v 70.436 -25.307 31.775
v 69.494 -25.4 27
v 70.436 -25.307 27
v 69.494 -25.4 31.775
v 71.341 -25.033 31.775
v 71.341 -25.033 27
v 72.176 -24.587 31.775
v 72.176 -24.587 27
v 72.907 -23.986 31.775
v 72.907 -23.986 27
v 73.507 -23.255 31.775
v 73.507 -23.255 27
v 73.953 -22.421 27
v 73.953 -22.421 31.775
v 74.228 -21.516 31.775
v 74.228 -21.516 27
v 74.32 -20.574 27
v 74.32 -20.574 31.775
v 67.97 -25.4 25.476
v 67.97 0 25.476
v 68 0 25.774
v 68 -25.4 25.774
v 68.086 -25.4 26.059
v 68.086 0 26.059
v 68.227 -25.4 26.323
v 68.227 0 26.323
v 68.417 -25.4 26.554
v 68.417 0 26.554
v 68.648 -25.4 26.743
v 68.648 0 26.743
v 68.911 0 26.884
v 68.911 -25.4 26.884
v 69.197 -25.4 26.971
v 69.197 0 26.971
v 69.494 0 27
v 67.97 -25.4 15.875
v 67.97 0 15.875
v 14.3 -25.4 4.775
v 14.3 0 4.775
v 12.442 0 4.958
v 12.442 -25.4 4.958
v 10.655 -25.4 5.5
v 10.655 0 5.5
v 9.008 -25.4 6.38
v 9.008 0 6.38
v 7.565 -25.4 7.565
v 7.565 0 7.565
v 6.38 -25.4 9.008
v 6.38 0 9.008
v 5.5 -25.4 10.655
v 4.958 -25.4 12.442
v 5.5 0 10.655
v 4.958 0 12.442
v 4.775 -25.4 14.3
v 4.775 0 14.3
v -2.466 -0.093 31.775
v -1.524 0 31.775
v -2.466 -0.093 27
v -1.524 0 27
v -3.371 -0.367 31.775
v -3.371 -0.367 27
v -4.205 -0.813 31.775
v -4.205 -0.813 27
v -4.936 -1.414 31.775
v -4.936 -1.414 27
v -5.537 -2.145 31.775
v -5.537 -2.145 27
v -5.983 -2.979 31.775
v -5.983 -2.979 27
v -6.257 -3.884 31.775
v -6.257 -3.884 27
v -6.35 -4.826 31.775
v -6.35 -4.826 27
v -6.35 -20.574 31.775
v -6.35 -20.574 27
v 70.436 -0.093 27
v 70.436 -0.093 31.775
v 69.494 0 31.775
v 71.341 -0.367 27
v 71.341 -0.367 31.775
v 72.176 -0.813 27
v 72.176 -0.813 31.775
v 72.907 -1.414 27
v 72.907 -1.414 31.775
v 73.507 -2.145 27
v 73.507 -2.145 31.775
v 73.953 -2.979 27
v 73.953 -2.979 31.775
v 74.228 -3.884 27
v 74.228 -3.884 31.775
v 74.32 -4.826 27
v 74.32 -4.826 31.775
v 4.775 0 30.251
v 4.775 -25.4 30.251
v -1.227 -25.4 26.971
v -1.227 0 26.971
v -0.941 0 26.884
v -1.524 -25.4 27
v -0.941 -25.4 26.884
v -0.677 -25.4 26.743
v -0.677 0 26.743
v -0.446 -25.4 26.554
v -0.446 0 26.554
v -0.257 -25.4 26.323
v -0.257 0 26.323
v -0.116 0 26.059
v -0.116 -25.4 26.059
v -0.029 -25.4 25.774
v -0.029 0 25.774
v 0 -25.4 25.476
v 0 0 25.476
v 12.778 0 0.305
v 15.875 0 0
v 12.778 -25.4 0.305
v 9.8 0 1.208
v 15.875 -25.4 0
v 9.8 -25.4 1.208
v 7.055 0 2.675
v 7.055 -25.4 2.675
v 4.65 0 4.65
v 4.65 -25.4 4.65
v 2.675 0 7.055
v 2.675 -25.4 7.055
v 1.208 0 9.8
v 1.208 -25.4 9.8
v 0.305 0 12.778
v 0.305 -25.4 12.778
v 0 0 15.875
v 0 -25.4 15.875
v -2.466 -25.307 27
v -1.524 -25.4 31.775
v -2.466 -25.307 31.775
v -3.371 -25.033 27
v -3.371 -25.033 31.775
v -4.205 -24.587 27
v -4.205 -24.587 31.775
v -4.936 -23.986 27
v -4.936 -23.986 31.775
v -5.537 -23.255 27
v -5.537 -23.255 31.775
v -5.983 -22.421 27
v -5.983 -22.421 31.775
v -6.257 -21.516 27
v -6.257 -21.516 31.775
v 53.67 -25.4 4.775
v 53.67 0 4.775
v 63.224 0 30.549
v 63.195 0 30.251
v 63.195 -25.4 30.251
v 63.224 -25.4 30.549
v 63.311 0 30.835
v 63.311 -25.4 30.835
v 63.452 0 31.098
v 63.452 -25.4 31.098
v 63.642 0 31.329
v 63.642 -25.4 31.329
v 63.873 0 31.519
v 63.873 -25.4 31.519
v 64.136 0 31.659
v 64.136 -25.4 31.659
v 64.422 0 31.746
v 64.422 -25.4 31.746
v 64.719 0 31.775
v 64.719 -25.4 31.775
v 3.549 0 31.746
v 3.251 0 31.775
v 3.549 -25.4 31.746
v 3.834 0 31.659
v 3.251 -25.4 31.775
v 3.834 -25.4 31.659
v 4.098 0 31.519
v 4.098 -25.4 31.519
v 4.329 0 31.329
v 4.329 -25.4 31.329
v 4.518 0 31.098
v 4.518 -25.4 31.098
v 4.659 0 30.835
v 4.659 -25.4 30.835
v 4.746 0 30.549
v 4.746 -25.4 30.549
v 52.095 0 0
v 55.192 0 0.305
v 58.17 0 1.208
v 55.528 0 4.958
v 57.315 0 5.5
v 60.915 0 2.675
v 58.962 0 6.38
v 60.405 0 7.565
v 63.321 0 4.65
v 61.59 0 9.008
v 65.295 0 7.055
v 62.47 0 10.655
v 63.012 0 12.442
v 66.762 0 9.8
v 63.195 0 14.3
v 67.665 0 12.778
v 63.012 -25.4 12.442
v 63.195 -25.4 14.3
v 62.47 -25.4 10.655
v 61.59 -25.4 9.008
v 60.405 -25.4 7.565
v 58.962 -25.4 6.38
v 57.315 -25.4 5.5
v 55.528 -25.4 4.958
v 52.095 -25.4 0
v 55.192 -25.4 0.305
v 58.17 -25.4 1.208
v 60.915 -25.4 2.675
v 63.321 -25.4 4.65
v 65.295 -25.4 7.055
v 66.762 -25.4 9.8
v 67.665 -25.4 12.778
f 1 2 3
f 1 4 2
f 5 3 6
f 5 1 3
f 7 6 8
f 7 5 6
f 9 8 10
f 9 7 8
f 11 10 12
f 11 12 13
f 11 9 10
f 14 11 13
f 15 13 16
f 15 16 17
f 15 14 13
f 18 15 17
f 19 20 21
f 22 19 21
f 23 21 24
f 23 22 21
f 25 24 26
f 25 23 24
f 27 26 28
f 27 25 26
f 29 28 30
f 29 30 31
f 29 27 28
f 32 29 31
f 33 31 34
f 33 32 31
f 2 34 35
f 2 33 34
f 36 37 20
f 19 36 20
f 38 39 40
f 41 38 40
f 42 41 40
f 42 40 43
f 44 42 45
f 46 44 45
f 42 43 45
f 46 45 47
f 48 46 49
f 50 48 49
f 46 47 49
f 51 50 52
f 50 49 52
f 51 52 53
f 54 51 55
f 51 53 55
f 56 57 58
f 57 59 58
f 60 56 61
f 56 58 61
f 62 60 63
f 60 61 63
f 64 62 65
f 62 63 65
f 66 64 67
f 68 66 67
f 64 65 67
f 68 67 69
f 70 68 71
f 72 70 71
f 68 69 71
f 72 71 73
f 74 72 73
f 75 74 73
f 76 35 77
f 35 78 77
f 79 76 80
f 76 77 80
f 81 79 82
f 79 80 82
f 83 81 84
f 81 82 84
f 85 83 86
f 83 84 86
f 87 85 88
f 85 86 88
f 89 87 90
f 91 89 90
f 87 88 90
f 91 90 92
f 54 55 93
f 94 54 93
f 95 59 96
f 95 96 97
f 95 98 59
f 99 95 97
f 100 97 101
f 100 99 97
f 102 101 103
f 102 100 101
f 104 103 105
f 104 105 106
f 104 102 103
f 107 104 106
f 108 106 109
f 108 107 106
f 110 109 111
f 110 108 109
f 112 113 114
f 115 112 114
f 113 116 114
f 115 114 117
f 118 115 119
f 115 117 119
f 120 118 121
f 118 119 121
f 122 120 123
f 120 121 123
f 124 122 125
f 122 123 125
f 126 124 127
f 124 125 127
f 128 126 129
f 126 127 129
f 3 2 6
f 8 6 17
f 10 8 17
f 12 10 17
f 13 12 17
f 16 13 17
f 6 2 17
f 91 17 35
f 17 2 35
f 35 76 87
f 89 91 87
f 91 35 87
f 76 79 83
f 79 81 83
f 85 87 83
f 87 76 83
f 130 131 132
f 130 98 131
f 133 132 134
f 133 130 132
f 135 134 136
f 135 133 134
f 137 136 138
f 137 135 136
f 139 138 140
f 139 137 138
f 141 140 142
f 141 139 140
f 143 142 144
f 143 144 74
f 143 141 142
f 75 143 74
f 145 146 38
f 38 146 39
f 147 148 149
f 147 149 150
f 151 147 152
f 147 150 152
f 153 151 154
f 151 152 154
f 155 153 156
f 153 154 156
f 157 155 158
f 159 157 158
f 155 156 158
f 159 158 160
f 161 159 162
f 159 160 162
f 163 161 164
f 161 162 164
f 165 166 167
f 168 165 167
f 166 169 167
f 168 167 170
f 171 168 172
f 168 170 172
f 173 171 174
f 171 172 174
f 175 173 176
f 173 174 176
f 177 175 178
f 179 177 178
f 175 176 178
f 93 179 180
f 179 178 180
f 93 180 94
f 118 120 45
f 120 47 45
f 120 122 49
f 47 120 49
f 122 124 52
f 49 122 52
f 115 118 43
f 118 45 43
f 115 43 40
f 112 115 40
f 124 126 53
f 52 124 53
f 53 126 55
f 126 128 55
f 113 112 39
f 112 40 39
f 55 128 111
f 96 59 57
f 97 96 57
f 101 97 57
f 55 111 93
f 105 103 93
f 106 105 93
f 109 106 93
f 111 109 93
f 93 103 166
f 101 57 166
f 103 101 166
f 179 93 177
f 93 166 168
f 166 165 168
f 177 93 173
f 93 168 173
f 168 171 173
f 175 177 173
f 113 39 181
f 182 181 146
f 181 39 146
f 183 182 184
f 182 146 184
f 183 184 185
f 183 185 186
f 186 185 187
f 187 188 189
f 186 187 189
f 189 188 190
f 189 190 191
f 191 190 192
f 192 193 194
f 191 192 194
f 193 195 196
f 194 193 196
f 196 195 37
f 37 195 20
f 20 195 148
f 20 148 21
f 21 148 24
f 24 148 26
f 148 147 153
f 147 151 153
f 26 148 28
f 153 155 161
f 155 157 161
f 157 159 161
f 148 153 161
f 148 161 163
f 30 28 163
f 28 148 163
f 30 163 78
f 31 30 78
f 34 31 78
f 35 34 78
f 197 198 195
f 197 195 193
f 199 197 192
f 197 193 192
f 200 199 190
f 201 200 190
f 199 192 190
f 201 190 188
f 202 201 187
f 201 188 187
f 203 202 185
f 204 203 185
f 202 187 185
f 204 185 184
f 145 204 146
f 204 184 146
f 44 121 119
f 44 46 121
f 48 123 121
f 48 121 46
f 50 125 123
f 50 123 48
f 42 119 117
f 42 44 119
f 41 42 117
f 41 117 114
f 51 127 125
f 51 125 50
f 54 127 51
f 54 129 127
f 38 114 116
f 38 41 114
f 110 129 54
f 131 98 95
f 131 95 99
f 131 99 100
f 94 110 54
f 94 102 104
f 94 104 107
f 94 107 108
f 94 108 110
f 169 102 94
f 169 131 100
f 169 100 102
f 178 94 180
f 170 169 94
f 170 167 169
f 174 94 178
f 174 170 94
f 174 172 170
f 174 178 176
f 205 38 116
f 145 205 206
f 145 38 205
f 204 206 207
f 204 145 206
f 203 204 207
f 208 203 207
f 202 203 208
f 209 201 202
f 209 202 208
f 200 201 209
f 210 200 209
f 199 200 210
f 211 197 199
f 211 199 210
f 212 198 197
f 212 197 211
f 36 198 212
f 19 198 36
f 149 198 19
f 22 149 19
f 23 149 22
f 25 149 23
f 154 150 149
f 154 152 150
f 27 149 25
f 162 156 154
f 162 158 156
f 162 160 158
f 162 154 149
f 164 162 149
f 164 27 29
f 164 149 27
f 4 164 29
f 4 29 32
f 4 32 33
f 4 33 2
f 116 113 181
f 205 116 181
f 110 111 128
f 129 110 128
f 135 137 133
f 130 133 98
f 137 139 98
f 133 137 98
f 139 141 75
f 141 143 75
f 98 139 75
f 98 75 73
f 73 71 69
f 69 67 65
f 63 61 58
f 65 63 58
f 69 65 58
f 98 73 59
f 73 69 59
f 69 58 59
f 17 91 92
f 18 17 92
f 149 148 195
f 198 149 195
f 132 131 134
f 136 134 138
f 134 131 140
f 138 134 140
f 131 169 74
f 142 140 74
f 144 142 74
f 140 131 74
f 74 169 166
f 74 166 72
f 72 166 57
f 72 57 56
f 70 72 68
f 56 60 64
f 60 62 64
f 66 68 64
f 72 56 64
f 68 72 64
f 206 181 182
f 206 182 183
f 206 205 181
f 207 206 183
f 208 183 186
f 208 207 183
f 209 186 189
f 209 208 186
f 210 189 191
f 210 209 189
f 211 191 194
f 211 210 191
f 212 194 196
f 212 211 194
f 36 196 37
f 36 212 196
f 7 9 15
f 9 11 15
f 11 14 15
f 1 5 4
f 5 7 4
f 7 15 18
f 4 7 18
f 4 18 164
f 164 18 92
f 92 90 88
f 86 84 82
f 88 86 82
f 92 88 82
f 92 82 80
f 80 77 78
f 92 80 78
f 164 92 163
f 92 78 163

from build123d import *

# Parameters (mm, degrees)
F1_DEPTH = 25.4
F2_R     = 15.875
F3_R     = 4.826
F4_R     = 1.524


with BuildPart() as f1:
    # F0 (on Front) → F1 (new body)
    with BuildSketch(Plane.XZ):
        with BuildLine():
            Line((0, 4.7752), (0, 0))
            Line((0, 0), (67.9704, 0))
            Line((67.9704, 0), (67.9704, 4.7752))
            Line((67.9704, 4.7752), (67.9704, 27.0002))
            Line((67.9704, 27.0002), (74.3204, 27.0002))
            Line((74.3204, 27.0002), (74.3204, 31.7754))
            Line((74.3204, 31.7754), (67.9704, 31.7754))
            Line((67.9704, 31.7754), (63.1952, 31.7754))
            Line((63.1952, 31.7754), (63.1952, 14.3002))
            ThreePointArc((63.1952, 14.3002), (60.405392, 7.565008), (53.6702, 4.7752))
            Line((53.6702, 4.7752), (14.3002, 4.7752))
            ThreePointArc((14.3002, 4.7752), (7.565008, 7.565008), (4.7752, 14.3002))
            Line((4.7752, 14.3002), (4.7752, 31.7754))
            Line((4.7752, 31.7754), (0, 31.7754))
            Line((0, 31.7754), (-6.35, 31.7754))
            Line((-6.35, 31.7754), (-6.35, 27.0002))
            Line((-6.35, 27.0002), (0, 27.0002))
            Line((0, 27.0002), (0, 4.7752))
        make_face()
    extrude(amount=F1_DEPTH)

    # F2
    f2_edges = [f1.edges().sort_by_distance(p)[0] for p in [
        (0, -12.7, 0),
        (67.9704, -12.7, 0),
    ]]
    fillet(f2_edges, radius=F2_R)

    # F3
    f3_edges = [f1.edges().sort_by_distance(p)[0] for p in [
        (-6.35, 0, 29.3878),
        (-6.35, -25.4, 29.3878),
        (74.3204, 0, 29.3878),
        (74.3204, -25.4, 29.3878),
    ]]
    fillet(f3_edges, radius=F3_R)

    # F4
    f4_edges = [f1.edges().sort_by_distance(p)[0] for p in [
        (0, -12.7, 27.0002),
        (4.7752, -12.7, 31.7754),
        (63.1952, -12.7, 31.7754),
        (67.9704, -12.7, 27.0002),
    ]]
    fillet(f4_edges, radius=F4_R)


solid = f1.part
